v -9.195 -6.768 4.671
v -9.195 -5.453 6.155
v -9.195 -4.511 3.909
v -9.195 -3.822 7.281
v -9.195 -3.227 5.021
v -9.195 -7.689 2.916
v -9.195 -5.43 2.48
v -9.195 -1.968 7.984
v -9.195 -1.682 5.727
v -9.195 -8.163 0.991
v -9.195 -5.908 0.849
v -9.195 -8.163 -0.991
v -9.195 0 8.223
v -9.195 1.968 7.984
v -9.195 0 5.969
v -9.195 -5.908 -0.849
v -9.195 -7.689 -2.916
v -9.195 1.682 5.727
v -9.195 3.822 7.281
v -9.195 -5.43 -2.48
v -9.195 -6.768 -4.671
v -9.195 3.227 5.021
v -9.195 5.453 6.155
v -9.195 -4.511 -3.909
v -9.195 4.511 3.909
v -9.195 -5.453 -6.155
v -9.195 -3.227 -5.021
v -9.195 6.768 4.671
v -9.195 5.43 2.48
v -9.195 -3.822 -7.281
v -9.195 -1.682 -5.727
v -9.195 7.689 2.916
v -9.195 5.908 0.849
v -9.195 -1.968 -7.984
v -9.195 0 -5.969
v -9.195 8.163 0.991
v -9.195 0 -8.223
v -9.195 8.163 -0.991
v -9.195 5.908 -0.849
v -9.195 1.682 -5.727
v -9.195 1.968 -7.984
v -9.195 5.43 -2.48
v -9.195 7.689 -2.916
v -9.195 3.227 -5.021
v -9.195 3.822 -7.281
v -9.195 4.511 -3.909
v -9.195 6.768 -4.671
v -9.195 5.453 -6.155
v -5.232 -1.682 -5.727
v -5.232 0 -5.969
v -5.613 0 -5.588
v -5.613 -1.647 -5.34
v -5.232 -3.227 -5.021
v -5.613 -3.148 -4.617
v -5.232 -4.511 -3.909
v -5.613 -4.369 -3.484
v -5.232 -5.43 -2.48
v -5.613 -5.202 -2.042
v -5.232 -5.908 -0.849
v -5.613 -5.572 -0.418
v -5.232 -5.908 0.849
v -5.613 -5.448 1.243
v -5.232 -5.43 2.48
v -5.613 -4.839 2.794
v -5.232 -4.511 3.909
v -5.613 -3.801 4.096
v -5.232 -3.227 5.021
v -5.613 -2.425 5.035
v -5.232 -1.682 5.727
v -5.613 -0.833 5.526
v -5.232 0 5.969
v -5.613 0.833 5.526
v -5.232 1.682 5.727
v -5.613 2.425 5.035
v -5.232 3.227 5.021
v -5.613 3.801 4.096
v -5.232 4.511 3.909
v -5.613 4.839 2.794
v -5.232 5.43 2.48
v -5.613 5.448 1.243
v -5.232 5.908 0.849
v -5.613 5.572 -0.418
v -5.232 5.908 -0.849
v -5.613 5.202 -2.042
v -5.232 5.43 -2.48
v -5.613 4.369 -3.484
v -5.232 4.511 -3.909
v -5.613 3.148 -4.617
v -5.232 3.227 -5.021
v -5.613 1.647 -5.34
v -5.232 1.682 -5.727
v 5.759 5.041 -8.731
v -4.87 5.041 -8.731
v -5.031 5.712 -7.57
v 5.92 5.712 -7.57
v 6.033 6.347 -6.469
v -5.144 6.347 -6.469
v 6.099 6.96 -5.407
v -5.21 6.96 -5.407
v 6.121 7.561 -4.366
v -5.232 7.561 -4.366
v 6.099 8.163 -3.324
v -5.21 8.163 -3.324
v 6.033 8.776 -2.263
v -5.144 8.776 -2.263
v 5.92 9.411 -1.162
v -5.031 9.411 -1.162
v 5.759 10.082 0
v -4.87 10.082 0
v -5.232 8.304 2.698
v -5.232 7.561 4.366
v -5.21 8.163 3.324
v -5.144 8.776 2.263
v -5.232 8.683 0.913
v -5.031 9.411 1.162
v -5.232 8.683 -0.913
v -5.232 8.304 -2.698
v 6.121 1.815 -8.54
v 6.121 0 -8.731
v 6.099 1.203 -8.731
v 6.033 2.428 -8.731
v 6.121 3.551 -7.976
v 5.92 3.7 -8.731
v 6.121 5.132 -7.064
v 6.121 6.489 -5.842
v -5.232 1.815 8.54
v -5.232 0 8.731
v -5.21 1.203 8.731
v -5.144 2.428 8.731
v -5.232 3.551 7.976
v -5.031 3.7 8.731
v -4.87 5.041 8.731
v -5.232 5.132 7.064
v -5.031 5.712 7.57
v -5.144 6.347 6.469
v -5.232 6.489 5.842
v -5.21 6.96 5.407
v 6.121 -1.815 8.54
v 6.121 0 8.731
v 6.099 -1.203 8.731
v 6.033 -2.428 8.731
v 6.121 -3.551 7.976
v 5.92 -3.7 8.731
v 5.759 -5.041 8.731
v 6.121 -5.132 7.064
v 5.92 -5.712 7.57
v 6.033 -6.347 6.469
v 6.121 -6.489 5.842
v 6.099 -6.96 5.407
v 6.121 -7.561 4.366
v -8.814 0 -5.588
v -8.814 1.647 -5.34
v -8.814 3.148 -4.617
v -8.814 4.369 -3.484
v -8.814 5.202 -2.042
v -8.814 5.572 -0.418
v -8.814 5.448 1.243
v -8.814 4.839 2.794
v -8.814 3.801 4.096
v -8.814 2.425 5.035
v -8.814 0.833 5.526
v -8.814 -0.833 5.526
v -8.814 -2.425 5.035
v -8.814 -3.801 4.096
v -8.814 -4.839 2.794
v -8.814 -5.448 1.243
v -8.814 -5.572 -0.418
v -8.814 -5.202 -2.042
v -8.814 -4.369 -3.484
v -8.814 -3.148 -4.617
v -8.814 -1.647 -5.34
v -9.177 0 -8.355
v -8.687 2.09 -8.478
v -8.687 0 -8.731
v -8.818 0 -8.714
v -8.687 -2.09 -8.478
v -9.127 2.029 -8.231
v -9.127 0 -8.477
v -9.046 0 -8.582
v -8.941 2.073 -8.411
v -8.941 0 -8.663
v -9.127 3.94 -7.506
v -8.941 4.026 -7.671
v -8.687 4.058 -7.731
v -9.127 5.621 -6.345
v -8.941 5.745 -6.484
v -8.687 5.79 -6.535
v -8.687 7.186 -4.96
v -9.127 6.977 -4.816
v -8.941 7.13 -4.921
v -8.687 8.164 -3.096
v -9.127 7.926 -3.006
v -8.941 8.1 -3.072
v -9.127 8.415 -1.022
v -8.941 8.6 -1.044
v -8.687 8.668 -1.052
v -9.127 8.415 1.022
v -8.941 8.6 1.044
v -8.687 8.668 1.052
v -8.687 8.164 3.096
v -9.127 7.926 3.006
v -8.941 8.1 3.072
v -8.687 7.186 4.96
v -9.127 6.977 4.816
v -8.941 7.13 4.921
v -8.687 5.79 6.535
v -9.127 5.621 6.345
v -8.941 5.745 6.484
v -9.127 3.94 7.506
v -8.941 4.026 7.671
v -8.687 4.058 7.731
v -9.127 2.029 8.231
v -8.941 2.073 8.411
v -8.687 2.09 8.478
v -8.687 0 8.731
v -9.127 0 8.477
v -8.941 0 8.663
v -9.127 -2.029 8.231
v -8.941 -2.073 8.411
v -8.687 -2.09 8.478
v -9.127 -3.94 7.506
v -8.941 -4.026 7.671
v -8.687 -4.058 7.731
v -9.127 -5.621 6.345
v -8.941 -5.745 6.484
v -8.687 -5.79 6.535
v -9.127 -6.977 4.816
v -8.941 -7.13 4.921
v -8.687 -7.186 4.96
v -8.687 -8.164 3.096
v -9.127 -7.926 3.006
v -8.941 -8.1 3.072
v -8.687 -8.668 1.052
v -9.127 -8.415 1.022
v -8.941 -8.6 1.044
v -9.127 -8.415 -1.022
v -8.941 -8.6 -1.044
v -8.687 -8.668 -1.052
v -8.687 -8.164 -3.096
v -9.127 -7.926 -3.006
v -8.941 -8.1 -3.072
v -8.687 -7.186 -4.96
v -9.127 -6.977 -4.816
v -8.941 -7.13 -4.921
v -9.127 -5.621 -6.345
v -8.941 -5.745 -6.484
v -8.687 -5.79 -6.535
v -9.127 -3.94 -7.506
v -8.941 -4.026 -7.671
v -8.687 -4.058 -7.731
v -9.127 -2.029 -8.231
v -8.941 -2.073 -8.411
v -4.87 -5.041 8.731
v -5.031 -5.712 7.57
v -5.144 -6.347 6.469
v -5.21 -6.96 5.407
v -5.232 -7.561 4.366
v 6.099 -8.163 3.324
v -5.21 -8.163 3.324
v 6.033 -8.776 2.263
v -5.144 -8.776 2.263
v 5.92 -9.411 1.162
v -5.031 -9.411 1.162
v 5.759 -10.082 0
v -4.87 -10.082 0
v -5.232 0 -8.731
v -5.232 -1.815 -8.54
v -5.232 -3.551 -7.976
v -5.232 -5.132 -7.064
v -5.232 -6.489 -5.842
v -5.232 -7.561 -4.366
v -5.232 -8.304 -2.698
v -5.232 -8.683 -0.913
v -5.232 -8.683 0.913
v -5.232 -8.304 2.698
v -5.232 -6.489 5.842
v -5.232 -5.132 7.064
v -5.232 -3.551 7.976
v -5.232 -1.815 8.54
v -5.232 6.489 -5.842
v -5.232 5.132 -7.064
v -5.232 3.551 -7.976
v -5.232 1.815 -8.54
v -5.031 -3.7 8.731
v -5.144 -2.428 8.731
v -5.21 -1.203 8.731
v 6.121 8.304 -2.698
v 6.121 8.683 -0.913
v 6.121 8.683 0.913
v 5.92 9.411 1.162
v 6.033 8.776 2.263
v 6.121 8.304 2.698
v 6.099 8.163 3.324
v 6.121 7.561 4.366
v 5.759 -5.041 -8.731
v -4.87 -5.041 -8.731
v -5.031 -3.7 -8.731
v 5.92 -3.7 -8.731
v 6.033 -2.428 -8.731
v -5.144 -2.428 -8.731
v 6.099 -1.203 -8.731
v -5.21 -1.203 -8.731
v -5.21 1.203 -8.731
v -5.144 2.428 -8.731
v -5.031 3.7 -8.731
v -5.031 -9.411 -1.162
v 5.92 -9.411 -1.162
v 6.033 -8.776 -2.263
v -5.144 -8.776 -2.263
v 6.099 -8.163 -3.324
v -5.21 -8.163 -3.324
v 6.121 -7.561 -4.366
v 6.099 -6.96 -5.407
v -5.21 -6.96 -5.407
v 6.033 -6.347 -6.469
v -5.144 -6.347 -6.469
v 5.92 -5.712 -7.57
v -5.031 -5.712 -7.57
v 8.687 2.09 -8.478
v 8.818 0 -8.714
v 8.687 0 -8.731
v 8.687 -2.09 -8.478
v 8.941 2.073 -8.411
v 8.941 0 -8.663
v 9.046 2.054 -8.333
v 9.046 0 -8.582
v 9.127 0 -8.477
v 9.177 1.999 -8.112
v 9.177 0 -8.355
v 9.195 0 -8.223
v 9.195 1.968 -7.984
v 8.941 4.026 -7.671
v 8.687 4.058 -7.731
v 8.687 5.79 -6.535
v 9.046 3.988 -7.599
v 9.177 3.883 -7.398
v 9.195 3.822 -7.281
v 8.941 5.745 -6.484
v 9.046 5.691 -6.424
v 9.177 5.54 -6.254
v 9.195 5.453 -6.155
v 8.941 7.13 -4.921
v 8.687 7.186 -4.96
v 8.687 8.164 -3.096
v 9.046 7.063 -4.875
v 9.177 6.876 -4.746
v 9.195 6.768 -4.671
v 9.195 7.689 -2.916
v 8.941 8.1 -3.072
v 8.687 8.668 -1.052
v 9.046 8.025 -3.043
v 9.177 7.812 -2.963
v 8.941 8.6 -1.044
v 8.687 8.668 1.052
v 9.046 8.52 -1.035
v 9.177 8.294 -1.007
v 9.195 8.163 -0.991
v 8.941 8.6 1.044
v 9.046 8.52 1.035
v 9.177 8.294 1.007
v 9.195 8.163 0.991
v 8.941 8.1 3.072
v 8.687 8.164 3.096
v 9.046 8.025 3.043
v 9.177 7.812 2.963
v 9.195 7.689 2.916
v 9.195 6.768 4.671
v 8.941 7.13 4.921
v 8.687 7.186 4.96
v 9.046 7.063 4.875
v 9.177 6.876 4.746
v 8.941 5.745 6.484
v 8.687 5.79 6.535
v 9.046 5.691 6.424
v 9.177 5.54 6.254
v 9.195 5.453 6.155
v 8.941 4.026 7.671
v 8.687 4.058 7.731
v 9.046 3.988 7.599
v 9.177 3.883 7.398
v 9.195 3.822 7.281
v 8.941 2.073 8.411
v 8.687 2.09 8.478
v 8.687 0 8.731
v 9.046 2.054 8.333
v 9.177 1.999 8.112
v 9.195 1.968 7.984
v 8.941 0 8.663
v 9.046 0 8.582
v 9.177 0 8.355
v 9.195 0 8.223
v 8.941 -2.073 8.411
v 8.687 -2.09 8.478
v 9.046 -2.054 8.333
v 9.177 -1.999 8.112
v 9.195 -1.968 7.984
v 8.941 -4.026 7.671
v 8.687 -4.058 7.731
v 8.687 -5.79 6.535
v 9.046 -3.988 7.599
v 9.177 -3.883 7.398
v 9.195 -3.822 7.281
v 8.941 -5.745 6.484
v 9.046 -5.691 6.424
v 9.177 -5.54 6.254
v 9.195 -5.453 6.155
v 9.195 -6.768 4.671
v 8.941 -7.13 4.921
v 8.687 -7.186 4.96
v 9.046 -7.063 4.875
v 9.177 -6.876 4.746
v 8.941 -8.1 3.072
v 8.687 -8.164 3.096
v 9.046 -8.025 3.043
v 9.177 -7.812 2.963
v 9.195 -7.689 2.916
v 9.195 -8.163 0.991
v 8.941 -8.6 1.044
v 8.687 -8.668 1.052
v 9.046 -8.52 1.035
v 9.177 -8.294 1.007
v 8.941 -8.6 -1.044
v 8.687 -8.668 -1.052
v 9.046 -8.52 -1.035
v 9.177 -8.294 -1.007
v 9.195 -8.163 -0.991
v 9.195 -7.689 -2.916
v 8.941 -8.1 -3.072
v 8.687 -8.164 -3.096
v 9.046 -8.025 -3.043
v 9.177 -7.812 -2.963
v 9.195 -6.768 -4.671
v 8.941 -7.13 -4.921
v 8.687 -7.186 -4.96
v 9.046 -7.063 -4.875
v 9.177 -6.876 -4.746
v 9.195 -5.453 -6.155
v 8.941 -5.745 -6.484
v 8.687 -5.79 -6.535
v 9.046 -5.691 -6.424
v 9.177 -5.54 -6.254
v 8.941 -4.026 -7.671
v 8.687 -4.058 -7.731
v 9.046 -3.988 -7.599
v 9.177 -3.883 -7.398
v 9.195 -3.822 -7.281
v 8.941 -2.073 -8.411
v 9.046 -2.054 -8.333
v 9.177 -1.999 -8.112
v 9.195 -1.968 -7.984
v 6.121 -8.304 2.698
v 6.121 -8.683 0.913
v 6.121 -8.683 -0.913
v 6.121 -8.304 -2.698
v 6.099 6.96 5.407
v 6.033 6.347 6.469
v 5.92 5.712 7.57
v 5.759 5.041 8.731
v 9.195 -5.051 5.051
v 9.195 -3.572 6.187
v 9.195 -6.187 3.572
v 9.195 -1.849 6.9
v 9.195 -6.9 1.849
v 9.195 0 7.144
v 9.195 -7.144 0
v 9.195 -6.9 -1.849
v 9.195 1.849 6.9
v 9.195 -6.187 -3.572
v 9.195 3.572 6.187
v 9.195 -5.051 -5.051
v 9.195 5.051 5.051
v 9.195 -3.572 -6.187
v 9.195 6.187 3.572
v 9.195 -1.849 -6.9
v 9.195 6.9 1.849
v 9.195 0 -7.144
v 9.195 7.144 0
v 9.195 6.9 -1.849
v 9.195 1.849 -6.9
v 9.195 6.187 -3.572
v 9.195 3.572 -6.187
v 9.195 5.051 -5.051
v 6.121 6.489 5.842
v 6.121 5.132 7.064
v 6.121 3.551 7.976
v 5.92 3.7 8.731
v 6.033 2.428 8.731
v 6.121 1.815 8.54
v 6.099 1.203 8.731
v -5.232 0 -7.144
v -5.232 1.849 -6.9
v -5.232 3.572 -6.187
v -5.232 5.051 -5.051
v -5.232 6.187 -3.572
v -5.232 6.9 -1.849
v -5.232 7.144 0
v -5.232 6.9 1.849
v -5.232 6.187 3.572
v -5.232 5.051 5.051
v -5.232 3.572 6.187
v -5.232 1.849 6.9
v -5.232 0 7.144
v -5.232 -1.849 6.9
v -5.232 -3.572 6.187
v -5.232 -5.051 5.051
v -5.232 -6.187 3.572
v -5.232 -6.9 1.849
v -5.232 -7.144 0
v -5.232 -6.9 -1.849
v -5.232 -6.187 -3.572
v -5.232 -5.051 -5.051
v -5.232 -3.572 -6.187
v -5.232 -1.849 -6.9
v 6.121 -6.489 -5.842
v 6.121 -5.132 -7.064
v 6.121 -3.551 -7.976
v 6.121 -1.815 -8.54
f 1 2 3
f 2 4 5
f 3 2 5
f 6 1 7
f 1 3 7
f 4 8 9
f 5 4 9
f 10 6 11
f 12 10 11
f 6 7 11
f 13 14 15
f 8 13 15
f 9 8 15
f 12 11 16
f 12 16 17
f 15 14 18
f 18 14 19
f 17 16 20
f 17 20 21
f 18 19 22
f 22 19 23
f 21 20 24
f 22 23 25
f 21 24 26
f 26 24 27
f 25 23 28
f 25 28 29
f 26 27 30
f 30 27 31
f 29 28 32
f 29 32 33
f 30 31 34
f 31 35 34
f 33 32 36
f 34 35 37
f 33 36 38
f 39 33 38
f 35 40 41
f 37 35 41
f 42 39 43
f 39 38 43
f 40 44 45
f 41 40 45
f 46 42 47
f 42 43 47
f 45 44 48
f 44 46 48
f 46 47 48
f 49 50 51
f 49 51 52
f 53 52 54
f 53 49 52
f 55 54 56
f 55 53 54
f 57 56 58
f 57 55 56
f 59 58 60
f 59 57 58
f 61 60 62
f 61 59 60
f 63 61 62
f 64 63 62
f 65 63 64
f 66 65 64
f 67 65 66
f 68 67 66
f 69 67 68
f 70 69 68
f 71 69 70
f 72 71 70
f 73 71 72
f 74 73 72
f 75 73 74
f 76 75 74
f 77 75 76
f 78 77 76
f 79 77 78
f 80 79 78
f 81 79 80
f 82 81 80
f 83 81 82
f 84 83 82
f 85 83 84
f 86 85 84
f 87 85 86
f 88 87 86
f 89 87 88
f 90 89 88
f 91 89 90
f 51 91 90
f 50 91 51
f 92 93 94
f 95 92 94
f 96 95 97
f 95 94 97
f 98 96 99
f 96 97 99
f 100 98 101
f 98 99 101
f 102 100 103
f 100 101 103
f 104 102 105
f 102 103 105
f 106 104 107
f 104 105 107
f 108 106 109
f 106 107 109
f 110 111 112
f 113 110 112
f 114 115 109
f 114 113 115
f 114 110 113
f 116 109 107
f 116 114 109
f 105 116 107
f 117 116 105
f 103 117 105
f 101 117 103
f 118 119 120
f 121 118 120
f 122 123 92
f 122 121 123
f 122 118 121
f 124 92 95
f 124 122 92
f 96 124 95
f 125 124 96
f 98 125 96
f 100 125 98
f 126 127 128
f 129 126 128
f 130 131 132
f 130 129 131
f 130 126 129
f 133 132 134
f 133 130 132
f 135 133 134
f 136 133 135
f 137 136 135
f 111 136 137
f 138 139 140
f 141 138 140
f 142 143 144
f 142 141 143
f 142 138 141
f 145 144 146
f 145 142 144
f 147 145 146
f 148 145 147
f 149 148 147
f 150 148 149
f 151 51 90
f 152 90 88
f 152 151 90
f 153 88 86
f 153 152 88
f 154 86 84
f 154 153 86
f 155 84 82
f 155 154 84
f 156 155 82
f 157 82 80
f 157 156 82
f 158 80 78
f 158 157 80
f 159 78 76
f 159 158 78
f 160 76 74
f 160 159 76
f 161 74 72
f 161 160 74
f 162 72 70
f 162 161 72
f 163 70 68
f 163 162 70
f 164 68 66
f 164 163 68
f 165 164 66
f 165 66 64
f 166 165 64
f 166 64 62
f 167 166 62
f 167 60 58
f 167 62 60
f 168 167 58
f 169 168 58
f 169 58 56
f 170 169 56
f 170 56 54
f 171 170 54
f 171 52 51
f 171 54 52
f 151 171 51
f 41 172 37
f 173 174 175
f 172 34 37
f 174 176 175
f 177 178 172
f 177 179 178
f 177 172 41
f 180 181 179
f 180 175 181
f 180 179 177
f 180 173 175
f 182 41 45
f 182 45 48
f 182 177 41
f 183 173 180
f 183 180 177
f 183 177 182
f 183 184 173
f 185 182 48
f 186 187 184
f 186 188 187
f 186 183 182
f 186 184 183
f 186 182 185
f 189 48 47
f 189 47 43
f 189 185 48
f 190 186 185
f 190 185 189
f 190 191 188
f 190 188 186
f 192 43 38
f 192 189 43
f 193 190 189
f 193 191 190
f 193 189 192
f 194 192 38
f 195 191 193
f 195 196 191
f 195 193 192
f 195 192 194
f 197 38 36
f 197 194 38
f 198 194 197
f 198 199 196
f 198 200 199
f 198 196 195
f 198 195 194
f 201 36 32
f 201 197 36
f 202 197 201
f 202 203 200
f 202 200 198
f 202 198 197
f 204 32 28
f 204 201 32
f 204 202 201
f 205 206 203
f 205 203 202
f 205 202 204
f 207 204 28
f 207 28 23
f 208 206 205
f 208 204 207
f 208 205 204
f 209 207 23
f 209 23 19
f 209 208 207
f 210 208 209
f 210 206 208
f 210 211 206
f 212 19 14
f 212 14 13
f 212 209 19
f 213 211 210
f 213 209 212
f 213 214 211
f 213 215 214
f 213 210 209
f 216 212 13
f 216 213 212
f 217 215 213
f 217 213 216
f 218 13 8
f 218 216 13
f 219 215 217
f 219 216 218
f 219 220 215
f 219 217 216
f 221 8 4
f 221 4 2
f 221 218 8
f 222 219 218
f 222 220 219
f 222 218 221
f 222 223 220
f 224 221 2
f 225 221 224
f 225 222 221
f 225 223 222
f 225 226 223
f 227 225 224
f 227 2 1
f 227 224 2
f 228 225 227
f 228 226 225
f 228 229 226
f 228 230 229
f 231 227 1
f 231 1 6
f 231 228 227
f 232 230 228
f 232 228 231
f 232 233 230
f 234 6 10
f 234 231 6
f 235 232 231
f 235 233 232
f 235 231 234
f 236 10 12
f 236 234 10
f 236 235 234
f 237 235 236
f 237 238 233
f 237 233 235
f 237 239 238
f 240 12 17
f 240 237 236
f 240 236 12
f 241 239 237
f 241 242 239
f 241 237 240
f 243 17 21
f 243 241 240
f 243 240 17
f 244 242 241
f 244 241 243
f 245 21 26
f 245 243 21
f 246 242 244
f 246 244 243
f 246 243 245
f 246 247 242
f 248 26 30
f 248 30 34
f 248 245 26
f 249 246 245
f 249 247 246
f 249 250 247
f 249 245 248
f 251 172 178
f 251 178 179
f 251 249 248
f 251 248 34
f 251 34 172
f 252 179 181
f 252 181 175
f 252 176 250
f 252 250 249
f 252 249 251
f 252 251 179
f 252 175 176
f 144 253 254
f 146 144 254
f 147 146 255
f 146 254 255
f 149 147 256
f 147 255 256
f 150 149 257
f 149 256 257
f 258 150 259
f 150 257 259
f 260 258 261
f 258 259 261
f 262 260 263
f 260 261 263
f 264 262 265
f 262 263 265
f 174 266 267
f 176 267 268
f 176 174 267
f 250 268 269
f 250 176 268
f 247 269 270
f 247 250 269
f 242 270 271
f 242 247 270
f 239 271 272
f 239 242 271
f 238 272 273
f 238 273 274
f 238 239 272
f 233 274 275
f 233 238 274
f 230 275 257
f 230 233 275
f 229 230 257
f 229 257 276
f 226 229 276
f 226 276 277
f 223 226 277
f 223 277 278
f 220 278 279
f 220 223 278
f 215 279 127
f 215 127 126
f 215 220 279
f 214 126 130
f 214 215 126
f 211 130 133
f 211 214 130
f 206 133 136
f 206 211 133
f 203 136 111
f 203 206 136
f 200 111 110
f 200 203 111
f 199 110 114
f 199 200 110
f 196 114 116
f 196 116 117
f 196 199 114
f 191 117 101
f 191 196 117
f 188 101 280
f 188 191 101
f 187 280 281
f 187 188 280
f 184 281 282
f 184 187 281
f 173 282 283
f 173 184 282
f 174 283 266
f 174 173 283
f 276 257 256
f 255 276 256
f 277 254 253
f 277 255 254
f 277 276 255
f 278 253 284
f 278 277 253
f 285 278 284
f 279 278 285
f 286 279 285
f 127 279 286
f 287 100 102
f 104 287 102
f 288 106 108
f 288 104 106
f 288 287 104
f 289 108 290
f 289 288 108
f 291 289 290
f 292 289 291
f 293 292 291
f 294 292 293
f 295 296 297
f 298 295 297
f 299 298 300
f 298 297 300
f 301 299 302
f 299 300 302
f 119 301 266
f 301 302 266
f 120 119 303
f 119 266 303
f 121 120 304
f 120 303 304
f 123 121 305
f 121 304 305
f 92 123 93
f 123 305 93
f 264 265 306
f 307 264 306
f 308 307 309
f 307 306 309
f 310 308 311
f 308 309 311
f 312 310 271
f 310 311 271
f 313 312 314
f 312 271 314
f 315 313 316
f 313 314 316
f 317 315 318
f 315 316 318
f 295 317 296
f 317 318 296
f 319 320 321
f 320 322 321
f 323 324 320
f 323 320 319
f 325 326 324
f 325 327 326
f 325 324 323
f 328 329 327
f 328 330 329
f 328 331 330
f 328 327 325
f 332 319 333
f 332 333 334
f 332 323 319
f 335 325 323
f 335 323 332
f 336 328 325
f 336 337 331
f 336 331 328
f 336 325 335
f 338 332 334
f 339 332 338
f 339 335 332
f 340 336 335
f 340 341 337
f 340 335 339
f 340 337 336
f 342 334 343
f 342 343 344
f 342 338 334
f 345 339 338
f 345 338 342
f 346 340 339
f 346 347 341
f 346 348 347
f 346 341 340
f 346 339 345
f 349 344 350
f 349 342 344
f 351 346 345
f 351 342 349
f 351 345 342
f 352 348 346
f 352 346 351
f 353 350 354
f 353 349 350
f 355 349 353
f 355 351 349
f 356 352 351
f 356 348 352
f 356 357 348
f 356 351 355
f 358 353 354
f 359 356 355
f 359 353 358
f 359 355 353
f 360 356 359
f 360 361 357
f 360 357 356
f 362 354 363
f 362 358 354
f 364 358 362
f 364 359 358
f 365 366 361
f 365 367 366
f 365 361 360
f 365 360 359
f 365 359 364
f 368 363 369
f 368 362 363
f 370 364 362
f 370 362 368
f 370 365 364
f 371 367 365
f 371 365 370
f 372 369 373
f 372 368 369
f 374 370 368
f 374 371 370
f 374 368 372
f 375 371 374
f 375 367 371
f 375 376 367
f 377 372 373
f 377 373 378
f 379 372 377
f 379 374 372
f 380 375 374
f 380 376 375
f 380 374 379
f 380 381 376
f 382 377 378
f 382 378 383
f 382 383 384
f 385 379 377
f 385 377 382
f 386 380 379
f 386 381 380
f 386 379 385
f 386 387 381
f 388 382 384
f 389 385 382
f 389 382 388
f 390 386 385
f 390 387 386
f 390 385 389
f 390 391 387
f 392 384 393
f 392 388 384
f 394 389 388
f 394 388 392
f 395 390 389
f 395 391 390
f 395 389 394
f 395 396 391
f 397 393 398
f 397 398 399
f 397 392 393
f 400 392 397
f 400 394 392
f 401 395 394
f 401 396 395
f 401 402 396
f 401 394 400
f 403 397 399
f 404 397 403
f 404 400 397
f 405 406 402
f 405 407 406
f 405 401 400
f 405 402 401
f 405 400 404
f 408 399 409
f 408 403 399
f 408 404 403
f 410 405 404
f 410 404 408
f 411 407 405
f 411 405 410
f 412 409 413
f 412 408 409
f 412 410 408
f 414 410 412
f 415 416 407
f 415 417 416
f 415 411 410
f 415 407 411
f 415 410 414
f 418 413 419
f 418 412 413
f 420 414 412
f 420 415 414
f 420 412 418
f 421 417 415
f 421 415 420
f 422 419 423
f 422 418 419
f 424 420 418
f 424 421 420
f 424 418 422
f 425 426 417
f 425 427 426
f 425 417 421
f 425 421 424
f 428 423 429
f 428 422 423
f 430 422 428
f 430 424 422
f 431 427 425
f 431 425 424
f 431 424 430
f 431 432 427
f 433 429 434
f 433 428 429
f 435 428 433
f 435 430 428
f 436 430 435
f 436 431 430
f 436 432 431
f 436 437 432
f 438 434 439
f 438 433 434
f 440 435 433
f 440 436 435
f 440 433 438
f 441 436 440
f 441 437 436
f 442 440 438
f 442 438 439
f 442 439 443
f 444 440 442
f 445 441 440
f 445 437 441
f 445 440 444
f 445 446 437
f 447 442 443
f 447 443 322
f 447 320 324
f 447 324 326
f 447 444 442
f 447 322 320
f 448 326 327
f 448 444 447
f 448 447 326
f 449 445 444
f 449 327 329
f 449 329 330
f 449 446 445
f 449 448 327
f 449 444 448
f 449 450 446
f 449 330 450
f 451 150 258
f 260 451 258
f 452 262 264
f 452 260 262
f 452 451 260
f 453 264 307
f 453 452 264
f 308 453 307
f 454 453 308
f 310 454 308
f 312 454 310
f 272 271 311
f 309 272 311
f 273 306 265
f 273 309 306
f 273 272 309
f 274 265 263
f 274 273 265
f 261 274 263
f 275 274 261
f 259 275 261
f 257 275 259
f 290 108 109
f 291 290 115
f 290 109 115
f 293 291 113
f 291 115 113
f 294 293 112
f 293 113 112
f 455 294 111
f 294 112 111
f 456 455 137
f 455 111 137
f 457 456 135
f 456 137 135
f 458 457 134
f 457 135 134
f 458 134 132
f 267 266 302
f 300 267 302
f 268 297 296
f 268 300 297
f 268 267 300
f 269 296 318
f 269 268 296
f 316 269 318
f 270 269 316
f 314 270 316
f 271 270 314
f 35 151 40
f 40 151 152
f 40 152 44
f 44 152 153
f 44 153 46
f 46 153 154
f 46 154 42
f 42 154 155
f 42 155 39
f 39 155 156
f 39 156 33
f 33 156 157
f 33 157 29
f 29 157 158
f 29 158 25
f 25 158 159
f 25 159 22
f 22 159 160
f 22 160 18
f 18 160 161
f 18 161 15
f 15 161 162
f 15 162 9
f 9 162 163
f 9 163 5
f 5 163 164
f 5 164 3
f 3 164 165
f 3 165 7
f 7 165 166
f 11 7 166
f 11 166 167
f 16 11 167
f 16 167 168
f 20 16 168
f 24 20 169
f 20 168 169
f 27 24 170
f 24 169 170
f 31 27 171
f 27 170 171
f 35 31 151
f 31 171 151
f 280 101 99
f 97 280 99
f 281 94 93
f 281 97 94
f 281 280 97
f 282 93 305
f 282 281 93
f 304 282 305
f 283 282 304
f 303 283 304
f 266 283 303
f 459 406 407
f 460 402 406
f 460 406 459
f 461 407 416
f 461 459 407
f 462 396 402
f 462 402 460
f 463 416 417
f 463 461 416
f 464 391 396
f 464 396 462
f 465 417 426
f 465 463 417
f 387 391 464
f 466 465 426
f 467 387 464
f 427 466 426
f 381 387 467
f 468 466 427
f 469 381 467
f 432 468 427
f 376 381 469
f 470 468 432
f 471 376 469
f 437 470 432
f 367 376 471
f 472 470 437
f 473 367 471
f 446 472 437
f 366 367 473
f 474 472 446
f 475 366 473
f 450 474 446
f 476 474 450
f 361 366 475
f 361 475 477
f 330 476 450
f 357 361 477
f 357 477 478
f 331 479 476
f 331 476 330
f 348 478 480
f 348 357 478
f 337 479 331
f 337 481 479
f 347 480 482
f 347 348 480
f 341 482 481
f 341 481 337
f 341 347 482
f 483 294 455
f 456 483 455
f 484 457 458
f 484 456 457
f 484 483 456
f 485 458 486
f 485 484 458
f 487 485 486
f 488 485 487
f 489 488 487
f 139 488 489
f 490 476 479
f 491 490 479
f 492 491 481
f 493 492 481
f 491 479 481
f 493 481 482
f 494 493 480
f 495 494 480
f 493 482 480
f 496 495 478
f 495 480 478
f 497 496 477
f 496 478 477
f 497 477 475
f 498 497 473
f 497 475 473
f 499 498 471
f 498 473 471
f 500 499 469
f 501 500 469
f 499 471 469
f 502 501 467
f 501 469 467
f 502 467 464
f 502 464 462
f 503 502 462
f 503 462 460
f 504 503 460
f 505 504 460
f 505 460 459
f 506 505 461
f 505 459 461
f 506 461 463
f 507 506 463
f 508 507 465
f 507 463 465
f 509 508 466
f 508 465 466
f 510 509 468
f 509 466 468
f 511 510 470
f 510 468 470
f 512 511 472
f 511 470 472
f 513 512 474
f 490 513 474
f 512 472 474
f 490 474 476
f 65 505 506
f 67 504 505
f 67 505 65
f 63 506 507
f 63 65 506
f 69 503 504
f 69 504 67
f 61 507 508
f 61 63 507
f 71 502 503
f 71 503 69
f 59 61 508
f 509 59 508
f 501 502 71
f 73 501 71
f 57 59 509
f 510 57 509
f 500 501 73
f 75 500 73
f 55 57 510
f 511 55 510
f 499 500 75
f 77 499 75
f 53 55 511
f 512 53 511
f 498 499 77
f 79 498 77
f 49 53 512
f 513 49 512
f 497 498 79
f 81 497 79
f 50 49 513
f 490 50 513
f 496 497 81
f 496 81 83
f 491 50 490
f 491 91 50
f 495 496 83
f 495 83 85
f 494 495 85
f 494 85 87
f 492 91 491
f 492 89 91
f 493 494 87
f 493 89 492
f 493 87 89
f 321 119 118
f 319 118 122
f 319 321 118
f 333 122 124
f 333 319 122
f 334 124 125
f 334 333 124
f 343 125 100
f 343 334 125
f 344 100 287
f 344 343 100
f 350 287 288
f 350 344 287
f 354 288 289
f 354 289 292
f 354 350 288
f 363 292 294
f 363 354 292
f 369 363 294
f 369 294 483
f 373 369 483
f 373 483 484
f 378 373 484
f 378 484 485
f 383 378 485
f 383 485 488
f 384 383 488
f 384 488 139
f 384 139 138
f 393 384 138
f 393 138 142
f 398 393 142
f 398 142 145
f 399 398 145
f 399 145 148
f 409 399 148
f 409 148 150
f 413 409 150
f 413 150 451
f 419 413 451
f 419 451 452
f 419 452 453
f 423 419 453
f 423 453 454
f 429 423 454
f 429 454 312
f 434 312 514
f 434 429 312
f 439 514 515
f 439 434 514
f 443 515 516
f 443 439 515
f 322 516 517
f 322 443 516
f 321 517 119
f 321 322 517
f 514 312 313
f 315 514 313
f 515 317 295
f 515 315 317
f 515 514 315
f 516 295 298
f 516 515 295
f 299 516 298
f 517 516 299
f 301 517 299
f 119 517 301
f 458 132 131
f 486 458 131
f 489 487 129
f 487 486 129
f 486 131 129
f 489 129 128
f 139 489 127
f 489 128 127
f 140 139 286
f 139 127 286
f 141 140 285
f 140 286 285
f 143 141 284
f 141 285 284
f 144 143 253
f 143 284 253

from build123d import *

# Parameters (mm, degrees)
BOSS_EXTRUDE1_DEPTH      = 9.1948
BOSS_EXTRUDE1_DEPTH_BACK = 9.1948
SKETCH3_R                = 5.588
SKETCH4_OUTSIDE_W        = 25.942
SKETCH4_OUTSIDE_H        = 28.644
SKETCH4_OUTSIDE_R        = 8.73125
CUT_EXTRUDE1_DEPTH       = 3.9624
SKETCH5_OUTSIDE_W        = 25.942
SKETCH5_OUTSIDE_H        = 28.644
SKETCH5_OUTSIDE_R        = 8.73125
CUT_EXTRUDE2_DEPTH       = 3.0734
SKETCH6_OUTSIDE_W        = 180.058
SKETCH6_OUTSIDE_H        = 182.76
SKETCH6_OUTSIDE_R        = 8.73125
CUT_EXTRUDE3_DEPTH       = 20.647522197
CUT_EXTRUDE3_DRAFT       = -75
SKETCH7_OUTSIDE_W        = 184.996
SKETCH7_OUTSIDE_H        = 187.698
SKETCH7_OUTSIDE_R        = 8.73125
CUT_EXTRUDE4_DEPTH       = 21.309283864
CUT_EXTRUDE4_DRAFT       = -75
SKETCH8_R                = 7.14375
CUT_EXTRUDE5_DEPTH       = 14.4272
CHAMFER1_SIZE            = 0.381
FILLET1_R                = 0.508


with BuildPart() as part:
    # Sketch3 → Boss-Extrude1 (new, two sides: drawn at the far end of the back side and taken through both)
    with BuildSketch(Plane(origin=(0, 0, 0), x_dir=(0, 0, -1), z_dir=(1, 0, 0)).offset(-BOSS_EXTRUDE1_DEPTH_BACK)):
        Polygon((8.73125, 5.040989538), (0, 10.081979076), (-8.73125, 5.040989538), (-8.73125, -5.040989538), (0, -10.081979076), (8.73125, -5.040989538), align=None)
        Circle(SKETCH3_R, mode=Mode.SUBTRACT)
    extrude(amount=BOSS_EXTRUDE1_DEPTH + BOSS_EXTRUDE1_DEPTH_BACK)

    # Sketch4 outside → Cut-Extrude1 (cut)
    with BuildSketch(Plane.ZY.offset(9.1948)):
        Rectangle(SKETCH4_OUTSIDE_W, SKETCH4_OUTSIDE_H)
        with Locations(Location((0, 0, 0), (0, 0, 180))):
            Circle(SKETCH4_OUTSIDE_R, mode=Mode.SUBTRACT)
    extrude(amount=-CUT_EXTRUDE1_DEPTH, mode=Mode.SUBTRACT)

    # Sketch5 outside → Cut-Extrude2 (cut)
    with BuildSketch(Plane(origin=(9.1948, 0, 0), x_dir=(0, 0, -1), z_dir=(1, 0, 0))):
        Rectangle(SKETCH5_OUTSIDE_W, SKETCH5_OUTSIDE_H)
        Circle(SKETCH5_OUTSIDE_R, mode=Mode.SUBTRACT)
    extrude(amount=-CUT_EXTRUDE2_DEPTH, mode=Mode.SUBTRACT)


with BuildPart() as cut_extrude3_tool:
    # Sketch6 outside → Cut-Extrude3 (with draft: the straight prism first)
    with BuildSketch(Plane.ZY.offset(5.2324)):
        Rectangle(SKETCH6_OUTSIDE_W, SKETCH6_OUTSIDE_H)
        with Locations(Location((0, 0, 0), (0, 0, 180))):
            Circle(SKETCH6_OUTSIDE_R, mode=Mode.SUBTRACT)
    extrude(amount=-CUT_EXTRUDE3_DEPTH)
    # Cut-Extrude3: the draft: its side faces are tilted about the plane it starts from
    cut_extrude3_sides = [cut_extrude3_tool.faces().sort_by_distance(p)[0] for p in [
        (5.091361099, -91.38, 0),
        (5.091361099, 0, 90.029),
        (5.091361099, 91.38, 0),
        (5.091361099, 0, -90.029),
        (5.091361099, 0, 8.73125),
    ]]
    draft(cut_extrude3_sides, Plane.ZY.offset(5.2324), CUT_EXTRUDE3_DRAFT)


with BuildPart() as part_1:
    add(part.part)

    # Cut-Extrude3: cut by cut_extrude3_tool
    add(cut_extrude3_tool.part, mode=Mode.SUBTRACT)


with BuildPart() as cut_extrude4_tool:
    # Sketch7 outside → Cut-Extrude4 (with draft: the straight prism first)
    with BuildSketch(Plane(origin=(6.1214, 0, 0), x_dir=(0, 0, -1), z_dir=(1, 0, 0))):
        Rectangle(SKETCH7_OUTSIDE_W, SKETCH7_OUTSIDE_H)
        Circle(SKETCH7_OUTSIDE_R, mode=Mode.SUBTRACT)
    extrude(amount=-CUT_EXTRUDE4_DEPTH)
    # Cut-Extrude4: the draft: its side faces are tilted about the plane it starts from
    cut_extrude4_sides = [cut_extrude4_tool.faces().sort_by_distance(p)[0] for p in [
        (-4.533241932, -93.849, 0),
        (-4.533241932, 0, -92.498),
        (-4.533241932, 93.849, 0),
        (-4.533241932, 0, 92.498),
        (-4.533241932, 0, 8.73125),
    ]]
    draft(cut_extrude4_sides, Plane(origin=(6.1214, 0, 0), x_dir=(0, 0, -1), z_dir=(1, 0, 0)), CUT_EXTRUDE4_DRAFT)


with BuildPart() as part_2:
    add(part_1.part)

    # Cut-Extrude4: cut by cut_extrude4_tool
    add(cut_extrude4_tool.part, mode=Mode.SUBTRACT)

    # Sketch8 → Cut-Extrude5 (cut)
    with BuildSketch(Plane(origin=(9.1948, 0, 0), x_dir=(0, 0, -1), z_dir=(1, 0, 0))):
        Circle(SKETCH8_R)
    extrude(amount=-CUT_EXTRUDE5_DEPTH, mode=Mode.SUBTRACT)

    # Chamfer1
    chamfer1_edges = [part_2.edges().sort_by_distance(p)[0] for p in [
        (-9.1948, 0, 5.588),
        (-5.2324, 0, 5.588),
    ]]
    chamfer(chamfer1_edges, length=CHAMFER1_SIZE)

    # Fillet1
    fillet1_edges = [part_2.edges().sort_by_distance(p)[0] for p in [
        (-9.1948, 0, 8.73125),
        (9.1948, 0, 8.73125),
    ]]
    fillet(fillet1_edges, radius=FILLET1_R)


solid = part_2.part
